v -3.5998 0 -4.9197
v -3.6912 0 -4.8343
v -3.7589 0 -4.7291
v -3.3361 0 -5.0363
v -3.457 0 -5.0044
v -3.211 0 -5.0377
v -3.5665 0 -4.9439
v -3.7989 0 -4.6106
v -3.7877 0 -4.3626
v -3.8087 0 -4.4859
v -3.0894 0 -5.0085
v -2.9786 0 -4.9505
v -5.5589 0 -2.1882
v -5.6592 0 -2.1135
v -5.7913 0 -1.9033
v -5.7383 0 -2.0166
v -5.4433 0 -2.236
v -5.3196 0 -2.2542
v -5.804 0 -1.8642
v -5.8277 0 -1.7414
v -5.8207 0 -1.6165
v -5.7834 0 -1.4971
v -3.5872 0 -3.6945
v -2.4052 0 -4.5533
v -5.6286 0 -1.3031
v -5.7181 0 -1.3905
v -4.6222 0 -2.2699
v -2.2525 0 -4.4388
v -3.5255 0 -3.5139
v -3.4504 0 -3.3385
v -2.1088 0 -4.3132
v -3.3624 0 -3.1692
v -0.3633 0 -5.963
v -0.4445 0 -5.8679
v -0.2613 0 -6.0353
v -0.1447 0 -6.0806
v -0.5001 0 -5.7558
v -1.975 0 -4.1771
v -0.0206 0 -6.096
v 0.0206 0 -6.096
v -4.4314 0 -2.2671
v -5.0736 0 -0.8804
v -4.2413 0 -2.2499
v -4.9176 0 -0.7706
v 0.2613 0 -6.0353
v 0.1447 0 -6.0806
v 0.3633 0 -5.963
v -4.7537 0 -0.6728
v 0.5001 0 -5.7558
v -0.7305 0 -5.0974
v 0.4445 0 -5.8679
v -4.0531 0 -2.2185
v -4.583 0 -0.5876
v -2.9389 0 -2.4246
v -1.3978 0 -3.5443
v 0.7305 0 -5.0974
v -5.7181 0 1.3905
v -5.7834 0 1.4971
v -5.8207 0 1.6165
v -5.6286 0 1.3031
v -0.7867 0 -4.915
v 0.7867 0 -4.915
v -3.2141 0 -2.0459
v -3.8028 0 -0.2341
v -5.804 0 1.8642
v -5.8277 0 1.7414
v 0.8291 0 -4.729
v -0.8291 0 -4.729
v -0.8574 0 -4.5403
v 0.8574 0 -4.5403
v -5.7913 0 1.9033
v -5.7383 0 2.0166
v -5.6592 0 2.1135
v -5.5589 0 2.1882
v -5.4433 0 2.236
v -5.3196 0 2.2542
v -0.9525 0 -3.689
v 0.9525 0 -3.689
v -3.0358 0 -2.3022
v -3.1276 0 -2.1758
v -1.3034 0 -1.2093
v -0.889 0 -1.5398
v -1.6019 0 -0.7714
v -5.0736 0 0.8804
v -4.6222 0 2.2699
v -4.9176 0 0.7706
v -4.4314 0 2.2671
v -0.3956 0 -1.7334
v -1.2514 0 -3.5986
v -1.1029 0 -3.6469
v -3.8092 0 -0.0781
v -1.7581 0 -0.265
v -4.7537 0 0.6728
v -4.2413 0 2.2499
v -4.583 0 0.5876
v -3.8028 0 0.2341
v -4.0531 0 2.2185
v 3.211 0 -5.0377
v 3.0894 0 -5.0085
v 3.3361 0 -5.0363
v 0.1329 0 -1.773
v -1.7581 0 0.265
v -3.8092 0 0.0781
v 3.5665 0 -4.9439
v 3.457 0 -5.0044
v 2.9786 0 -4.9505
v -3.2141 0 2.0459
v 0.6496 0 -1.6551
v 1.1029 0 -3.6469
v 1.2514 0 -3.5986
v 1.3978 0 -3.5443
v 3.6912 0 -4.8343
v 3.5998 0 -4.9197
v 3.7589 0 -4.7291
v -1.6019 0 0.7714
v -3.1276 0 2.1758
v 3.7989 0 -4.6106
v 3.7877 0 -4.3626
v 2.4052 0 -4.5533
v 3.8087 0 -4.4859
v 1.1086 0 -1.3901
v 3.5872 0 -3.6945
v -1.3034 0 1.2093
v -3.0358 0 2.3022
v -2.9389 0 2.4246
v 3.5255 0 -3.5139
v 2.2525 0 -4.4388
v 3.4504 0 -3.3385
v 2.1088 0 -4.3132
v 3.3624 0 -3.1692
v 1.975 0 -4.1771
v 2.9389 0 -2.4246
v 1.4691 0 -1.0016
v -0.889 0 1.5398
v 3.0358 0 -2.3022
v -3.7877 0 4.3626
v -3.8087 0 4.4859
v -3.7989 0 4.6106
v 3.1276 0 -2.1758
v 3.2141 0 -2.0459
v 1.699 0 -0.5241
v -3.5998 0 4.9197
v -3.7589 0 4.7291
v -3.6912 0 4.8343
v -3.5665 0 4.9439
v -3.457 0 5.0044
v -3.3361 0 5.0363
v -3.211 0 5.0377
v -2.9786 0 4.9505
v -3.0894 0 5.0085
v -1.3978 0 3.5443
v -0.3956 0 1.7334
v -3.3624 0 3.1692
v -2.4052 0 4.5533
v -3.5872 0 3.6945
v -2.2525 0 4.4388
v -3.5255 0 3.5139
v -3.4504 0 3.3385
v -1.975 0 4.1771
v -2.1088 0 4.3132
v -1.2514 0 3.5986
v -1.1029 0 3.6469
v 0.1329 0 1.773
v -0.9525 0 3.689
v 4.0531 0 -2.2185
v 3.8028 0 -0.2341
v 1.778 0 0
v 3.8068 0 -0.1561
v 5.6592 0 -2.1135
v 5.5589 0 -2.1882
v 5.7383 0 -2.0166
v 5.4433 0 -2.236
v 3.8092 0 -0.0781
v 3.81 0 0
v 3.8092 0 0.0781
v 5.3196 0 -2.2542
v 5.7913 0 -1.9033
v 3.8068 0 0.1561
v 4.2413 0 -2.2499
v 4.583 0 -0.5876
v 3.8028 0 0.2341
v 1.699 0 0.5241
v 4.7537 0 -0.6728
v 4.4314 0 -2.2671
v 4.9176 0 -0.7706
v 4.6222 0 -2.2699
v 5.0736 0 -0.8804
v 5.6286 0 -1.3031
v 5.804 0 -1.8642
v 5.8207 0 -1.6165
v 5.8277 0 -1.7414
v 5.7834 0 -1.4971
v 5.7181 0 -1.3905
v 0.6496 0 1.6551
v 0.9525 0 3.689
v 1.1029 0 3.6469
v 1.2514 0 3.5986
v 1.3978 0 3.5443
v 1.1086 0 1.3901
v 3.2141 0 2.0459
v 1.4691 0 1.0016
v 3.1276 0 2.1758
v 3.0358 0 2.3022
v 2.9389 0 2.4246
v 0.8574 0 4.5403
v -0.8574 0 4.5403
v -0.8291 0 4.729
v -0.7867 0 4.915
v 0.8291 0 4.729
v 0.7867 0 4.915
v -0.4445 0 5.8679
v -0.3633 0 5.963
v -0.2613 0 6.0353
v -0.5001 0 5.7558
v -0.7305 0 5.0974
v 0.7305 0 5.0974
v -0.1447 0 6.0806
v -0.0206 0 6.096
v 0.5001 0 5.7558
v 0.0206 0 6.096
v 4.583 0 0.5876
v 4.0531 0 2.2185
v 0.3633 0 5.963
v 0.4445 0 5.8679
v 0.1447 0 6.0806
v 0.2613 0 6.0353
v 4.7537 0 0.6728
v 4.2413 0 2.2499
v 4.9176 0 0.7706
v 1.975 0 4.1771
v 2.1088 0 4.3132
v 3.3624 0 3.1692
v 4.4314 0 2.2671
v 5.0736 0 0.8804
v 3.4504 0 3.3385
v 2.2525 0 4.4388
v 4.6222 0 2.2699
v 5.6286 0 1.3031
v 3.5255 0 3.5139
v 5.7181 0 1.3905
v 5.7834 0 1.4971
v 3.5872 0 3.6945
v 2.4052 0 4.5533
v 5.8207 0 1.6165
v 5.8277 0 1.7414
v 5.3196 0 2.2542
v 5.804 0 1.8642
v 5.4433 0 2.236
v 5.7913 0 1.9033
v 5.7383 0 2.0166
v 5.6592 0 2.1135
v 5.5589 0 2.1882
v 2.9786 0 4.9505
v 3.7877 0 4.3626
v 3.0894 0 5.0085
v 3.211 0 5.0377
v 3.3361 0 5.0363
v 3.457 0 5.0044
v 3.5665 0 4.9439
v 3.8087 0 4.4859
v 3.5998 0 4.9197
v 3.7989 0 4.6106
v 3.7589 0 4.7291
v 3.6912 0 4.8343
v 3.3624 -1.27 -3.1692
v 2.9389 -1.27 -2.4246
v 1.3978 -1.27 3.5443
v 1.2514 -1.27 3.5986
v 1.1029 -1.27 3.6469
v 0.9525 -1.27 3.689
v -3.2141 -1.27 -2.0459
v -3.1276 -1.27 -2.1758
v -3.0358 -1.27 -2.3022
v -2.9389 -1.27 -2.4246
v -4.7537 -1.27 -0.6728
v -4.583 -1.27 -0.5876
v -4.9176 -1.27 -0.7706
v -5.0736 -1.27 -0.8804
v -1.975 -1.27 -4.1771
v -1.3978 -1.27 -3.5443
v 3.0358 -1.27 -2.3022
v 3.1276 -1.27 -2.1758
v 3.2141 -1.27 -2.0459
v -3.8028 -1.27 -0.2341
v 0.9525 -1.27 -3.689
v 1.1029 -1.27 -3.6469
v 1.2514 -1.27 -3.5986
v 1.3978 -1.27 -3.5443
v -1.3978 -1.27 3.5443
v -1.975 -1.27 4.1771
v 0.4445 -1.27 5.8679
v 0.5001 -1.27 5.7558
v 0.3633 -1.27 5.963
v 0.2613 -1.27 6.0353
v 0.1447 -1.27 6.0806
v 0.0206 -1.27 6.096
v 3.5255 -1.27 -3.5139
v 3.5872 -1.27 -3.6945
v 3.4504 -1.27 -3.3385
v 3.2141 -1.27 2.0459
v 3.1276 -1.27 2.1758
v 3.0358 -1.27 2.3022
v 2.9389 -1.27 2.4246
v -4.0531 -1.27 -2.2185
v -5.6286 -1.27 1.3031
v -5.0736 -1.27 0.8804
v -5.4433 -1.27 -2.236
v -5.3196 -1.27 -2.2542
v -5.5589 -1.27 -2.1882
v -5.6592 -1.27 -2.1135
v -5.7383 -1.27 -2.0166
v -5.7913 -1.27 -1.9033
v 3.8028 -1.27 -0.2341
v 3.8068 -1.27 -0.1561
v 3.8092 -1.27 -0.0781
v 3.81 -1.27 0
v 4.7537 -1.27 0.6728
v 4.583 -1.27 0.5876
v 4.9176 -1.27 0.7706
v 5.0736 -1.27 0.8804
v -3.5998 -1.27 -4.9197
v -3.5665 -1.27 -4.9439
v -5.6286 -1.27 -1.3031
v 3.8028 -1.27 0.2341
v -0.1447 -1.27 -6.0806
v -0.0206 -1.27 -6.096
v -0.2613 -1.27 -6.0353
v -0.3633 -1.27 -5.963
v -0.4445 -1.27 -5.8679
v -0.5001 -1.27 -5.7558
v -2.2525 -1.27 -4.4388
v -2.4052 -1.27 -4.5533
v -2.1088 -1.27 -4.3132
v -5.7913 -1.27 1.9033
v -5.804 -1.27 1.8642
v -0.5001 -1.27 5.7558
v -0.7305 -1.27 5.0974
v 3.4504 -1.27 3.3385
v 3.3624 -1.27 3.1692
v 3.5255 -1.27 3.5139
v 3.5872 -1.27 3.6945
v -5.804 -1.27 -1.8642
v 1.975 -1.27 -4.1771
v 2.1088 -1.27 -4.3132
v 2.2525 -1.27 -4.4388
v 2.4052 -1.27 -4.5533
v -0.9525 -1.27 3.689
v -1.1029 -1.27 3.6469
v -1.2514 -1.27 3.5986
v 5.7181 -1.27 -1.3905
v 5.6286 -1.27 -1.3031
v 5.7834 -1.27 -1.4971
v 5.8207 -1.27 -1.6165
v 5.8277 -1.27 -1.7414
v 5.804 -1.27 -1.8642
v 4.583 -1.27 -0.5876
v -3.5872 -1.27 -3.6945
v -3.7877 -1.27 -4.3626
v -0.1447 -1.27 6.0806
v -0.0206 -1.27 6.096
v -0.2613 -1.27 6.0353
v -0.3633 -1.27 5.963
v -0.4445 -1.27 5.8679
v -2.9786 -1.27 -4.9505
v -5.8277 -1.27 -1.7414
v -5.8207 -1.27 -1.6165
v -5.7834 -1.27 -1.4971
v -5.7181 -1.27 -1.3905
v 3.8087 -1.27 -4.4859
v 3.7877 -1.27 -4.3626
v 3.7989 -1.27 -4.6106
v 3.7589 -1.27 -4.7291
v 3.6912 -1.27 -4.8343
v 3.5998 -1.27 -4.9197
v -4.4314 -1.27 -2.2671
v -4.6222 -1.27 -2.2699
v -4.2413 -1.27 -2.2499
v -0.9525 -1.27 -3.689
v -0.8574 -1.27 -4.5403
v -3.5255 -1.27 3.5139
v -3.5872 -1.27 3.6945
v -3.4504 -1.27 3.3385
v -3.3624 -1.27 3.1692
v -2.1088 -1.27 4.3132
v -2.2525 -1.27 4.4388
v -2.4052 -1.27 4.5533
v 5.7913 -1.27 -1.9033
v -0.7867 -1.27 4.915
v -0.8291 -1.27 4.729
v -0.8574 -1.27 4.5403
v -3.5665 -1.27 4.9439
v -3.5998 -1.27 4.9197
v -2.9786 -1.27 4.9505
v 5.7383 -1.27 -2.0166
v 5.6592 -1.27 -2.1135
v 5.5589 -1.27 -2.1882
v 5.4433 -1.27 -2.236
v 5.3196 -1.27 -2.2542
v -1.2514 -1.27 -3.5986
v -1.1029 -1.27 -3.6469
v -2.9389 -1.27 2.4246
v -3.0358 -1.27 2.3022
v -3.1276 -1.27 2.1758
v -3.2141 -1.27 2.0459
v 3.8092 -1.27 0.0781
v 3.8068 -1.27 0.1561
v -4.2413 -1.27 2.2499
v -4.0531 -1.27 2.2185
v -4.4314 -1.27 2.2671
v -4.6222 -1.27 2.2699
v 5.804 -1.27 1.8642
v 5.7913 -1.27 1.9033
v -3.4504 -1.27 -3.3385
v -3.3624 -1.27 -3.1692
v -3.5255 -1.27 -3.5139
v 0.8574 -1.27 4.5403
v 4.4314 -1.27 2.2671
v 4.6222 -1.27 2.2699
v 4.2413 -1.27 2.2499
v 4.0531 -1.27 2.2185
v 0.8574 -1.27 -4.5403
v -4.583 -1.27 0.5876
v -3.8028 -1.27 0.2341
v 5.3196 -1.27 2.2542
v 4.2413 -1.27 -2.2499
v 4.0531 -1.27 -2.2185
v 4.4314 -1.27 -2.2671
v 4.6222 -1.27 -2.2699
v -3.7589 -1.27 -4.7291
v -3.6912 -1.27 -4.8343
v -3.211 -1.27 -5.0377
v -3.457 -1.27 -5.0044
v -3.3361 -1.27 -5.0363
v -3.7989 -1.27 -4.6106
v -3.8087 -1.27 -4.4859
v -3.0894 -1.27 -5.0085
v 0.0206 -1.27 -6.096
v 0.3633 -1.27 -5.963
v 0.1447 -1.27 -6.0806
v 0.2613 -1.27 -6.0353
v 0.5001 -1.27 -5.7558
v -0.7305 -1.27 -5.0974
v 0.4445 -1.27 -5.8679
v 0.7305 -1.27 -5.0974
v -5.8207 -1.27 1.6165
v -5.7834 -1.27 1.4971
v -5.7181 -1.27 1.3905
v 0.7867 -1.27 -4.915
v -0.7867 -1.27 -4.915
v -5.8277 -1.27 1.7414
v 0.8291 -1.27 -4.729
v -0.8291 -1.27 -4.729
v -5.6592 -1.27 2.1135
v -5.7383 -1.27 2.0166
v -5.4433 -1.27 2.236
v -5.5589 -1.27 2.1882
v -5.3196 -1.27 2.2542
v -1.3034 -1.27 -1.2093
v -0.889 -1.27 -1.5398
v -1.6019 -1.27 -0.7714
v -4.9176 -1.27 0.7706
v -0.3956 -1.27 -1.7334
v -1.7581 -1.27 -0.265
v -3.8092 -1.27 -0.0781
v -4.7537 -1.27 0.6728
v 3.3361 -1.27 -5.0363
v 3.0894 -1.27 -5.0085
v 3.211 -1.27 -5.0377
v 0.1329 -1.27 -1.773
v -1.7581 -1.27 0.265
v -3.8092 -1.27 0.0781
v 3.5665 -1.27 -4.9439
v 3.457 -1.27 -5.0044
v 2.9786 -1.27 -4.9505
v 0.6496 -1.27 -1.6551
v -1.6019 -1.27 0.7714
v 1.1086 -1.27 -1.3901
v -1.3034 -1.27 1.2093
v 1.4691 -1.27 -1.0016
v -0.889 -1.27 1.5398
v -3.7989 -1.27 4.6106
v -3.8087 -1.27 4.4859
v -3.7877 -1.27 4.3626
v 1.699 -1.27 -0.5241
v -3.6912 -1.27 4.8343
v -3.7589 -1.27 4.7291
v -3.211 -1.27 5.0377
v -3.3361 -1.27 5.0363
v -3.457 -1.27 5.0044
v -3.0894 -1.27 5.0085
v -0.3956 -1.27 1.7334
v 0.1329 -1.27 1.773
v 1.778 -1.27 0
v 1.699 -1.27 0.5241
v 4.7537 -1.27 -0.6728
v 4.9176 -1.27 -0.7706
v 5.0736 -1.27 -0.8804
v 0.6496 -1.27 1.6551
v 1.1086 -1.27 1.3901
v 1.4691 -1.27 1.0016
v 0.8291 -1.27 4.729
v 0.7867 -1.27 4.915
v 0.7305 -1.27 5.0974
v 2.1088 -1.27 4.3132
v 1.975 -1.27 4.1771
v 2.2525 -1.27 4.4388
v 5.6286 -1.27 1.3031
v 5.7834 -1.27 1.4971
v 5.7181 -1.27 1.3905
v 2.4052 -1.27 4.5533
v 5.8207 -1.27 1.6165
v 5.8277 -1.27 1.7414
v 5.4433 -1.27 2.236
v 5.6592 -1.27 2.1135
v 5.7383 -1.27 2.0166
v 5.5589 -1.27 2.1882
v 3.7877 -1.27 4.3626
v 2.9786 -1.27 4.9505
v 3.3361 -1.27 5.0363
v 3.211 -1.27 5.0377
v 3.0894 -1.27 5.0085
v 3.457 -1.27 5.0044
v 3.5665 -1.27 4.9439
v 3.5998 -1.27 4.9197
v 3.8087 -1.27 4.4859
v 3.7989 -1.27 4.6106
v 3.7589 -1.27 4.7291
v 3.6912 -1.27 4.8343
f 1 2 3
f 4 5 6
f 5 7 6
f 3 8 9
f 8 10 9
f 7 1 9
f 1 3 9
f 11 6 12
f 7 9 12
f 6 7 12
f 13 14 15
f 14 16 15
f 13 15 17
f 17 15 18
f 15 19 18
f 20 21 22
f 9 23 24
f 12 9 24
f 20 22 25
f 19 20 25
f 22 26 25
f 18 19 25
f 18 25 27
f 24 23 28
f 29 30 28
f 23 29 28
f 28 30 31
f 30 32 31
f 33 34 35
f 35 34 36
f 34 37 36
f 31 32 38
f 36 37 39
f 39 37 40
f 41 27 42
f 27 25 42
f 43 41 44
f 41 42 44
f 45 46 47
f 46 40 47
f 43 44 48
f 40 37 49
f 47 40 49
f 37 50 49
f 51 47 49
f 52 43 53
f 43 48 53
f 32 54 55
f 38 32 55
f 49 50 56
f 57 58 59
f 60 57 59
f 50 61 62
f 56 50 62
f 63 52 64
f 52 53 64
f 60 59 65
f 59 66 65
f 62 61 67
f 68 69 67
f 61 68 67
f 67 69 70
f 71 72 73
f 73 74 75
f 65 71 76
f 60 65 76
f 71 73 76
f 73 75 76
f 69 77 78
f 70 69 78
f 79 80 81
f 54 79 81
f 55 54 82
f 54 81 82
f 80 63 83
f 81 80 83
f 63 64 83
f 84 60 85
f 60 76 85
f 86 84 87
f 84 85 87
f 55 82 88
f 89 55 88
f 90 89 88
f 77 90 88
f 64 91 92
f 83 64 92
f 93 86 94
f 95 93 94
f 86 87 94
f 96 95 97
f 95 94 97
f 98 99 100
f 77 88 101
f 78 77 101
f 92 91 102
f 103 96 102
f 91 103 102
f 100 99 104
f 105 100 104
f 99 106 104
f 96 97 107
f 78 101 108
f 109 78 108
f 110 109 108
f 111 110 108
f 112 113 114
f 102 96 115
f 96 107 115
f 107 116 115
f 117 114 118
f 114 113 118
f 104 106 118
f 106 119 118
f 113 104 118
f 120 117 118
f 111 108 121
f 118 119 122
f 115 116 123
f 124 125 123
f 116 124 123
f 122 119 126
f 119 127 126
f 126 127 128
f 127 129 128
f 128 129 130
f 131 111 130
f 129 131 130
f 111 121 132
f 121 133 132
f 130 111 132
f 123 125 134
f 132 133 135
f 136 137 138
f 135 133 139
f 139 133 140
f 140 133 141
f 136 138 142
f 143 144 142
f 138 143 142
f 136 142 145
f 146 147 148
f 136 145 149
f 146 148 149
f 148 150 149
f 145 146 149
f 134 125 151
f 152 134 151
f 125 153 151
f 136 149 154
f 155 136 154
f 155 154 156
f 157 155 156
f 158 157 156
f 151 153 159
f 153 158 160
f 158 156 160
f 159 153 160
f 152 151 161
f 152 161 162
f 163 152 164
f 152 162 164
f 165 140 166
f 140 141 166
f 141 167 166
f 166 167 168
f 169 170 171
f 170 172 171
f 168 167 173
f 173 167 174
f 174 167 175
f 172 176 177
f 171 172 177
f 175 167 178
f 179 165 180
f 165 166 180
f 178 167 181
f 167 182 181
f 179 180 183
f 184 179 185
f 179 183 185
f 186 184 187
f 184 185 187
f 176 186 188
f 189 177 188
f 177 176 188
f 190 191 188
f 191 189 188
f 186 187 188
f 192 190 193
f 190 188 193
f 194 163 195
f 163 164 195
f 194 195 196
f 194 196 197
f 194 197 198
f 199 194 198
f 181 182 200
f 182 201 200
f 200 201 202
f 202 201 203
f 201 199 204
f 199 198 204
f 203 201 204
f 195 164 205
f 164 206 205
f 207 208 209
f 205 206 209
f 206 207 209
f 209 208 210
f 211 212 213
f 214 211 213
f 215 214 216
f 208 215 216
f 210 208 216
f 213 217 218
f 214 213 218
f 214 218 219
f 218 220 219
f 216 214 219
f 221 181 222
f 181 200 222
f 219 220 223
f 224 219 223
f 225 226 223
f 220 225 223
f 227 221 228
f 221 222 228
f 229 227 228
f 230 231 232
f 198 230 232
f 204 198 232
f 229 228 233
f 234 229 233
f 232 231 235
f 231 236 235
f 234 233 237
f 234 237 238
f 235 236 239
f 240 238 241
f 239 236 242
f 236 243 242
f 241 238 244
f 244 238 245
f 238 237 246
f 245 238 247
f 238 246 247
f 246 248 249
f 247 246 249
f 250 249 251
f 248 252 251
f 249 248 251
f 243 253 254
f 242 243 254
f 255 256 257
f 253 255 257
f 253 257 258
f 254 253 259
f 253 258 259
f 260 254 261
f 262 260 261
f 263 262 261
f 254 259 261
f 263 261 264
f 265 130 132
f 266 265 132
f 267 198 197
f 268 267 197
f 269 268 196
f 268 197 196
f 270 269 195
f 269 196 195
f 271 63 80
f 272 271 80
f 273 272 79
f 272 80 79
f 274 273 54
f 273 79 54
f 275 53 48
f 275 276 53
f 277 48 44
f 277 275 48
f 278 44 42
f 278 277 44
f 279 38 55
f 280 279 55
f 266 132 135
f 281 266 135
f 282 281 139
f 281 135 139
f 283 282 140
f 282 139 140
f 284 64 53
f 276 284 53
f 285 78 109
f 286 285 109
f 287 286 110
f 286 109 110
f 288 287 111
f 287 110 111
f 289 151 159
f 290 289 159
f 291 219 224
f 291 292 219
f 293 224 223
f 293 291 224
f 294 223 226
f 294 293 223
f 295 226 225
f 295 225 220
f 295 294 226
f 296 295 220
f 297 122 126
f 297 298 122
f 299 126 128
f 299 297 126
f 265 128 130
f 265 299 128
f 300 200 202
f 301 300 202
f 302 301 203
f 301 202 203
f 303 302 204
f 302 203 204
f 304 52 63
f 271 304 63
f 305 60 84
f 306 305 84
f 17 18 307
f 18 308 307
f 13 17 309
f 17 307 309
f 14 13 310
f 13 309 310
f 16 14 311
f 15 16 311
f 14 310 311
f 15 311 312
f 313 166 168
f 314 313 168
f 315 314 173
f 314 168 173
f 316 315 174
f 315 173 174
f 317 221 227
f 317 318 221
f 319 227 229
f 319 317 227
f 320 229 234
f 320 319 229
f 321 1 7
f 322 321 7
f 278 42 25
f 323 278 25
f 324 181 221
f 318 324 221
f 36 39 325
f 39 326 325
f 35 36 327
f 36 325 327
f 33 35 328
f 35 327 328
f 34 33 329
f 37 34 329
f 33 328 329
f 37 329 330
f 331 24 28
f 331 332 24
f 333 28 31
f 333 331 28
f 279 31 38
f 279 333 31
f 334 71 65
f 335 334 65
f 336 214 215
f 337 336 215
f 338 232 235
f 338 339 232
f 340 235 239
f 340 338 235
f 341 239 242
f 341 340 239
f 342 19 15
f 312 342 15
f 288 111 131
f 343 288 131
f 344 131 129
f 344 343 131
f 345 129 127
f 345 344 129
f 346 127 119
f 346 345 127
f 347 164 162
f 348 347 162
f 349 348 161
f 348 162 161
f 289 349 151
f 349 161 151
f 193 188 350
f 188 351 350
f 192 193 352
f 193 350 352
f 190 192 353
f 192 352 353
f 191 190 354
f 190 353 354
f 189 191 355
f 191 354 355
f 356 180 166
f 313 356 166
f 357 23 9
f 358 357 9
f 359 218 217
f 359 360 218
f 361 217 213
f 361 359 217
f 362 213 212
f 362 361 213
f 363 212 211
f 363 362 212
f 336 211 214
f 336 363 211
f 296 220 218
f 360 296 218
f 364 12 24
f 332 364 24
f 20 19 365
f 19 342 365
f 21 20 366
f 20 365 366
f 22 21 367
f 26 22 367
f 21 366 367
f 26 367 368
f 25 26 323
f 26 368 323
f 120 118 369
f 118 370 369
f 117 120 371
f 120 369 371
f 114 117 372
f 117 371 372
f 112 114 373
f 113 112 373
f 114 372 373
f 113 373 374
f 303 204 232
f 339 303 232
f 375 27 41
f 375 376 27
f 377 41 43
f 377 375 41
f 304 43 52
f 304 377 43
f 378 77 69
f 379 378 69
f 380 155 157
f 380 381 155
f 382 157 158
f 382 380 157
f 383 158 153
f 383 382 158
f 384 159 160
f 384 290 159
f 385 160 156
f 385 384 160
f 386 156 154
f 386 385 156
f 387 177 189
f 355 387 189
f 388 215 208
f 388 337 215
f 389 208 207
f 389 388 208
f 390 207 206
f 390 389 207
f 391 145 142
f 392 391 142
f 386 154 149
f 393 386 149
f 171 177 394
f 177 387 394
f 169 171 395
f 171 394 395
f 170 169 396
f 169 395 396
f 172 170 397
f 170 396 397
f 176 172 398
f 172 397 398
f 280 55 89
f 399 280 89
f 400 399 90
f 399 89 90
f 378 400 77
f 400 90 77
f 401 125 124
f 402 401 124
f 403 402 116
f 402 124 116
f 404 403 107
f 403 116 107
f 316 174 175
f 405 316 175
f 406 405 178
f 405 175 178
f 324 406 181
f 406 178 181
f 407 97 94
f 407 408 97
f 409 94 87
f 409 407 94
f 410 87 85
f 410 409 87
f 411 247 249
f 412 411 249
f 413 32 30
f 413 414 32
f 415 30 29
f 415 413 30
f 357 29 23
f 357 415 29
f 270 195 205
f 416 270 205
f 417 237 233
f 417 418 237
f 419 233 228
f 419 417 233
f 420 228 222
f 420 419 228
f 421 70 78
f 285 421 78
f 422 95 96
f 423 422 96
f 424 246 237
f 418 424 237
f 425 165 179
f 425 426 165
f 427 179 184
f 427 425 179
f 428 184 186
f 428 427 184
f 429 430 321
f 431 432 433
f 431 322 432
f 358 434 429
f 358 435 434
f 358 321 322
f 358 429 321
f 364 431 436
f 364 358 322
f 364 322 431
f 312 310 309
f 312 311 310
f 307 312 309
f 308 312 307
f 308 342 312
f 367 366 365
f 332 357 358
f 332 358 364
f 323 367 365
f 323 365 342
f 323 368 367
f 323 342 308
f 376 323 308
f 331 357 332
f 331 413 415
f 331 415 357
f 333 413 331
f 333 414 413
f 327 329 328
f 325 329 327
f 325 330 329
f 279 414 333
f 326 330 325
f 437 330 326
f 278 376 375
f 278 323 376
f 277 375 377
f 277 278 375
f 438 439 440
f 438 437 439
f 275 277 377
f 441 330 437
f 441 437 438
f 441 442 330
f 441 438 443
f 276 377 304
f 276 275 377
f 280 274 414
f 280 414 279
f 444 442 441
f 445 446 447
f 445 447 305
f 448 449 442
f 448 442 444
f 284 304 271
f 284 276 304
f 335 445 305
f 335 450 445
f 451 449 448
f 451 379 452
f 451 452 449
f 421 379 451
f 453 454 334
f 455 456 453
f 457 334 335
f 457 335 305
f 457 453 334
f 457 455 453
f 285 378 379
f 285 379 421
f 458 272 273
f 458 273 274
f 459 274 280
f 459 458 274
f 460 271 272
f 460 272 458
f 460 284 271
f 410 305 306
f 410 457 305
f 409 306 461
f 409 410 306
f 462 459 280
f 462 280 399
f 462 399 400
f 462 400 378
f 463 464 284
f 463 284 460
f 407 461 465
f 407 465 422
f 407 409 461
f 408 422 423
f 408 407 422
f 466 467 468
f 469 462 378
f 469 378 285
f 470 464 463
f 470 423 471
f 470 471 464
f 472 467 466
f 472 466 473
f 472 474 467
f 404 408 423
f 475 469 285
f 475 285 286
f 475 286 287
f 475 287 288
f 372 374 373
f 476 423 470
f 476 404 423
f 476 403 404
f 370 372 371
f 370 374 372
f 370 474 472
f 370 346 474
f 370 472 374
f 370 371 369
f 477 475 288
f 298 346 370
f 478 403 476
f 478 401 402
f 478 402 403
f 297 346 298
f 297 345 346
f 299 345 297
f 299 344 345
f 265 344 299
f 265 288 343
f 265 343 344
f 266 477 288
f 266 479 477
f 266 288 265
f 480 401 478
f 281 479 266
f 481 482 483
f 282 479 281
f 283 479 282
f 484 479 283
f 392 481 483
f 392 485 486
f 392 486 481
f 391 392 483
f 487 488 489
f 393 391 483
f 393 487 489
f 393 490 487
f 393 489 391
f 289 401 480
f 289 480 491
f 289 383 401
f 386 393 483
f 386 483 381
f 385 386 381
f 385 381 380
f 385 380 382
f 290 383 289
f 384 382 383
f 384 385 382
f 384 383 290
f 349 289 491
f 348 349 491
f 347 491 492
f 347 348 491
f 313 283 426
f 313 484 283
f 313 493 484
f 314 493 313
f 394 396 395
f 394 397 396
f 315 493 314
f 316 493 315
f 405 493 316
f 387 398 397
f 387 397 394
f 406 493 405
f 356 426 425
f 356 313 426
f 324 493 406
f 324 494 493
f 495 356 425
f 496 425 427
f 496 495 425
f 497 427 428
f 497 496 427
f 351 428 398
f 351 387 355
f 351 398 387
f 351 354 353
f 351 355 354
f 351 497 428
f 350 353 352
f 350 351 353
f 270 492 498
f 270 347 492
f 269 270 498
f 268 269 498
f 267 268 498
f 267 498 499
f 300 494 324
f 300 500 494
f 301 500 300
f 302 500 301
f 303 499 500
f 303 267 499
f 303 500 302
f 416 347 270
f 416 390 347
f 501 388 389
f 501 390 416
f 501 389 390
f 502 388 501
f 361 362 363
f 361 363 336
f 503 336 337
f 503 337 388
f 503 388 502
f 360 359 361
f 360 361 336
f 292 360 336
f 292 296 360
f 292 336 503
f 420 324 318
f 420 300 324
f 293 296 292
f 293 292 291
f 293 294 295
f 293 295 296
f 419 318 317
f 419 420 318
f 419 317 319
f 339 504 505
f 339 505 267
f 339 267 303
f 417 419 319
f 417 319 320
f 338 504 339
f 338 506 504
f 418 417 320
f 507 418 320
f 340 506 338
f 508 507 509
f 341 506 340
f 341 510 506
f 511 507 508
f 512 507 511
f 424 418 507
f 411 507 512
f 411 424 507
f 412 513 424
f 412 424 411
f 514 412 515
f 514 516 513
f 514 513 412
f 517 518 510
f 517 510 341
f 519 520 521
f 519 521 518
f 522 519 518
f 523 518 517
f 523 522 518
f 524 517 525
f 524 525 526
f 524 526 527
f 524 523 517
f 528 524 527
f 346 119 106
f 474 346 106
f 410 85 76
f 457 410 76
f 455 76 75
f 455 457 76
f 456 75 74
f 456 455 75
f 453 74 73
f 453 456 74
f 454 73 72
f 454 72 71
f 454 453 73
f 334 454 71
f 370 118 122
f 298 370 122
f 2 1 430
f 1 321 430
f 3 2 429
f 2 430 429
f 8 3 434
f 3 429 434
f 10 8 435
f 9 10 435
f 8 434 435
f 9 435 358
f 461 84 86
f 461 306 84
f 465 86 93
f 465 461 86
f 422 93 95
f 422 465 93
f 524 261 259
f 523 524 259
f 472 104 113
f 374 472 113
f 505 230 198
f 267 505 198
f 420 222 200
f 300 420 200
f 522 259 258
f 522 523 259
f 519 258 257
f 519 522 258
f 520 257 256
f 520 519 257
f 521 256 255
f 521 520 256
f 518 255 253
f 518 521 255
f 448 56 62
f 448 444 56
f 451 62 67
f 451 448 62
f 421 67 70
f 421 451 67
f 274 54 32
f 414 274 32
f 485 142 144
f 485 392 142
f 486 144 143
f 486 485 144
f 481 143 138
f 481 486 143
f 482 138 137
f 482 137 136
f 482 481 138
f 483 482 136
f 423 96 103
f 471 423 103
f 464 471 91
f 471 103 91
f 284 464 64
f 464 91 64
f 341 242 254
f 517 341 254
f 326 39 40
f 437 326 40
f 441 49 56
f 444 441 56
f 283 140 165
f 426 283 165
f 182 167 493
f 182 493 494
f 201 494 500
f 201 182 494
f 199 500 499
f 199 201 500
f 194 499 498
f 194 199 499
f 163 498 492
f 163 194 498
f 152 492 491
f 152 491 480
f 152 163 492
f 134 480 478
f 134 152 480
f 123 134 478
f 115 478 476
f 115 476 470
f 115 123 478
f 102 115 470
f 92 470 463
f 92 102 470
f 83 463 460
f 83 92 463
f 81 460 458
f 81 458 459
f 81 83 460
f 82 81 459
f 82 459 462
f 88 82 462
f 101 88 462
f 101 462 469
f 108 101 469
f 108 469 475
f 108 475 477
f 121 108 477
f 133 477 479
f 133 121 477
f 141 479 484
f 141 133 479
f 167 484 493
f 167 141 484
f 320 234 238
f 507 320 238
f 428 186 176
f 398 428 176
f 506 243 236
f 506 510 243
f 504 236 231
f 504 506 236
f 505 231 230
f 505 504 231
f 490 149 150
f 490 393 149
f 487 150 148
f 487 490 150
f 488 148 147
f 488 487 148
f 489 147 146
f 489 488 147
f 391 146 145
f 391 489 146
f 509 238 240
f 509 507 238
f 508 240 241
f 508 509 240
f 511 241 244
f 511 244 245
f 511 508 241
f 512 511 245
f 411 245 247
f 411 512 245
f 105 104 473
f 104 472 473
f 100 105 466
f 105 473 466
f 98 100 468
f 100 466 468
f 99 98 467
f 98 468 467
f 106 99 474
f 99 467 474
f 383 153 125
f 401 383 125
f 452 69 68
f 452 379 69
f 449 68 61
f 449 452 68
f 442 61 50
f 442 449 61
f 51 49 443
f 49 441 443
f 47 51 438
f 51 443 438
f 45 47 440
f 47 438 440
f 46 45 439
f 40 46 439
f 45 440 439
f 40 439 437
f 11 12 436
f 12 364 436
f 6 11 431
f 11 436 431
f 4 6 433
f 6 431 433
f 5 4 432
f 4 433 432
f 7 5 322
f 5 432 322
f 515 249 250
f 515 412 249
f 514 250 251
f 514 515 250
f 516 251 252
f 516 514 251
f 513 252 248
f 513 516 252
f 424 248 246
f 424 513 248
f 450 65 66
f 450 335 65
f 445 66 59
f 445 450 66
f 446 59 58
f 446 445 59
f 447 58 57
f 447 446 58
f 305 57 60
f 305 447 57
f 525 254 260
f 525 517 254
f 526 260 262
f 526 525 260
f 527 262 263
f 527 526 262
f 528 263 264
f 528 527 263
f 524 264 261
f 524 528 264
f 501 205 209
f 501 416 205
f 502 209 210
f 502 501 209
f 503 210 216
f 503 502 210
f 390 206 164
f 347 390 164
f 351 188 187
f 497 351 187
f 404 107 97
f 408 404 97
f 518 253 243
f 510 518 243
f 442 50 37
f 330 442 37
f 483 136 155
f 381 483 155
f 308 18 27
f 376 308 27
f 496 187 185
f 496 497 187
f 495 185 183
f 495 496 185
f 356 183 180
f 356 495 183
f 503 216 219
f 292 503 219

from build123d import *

# Parameters (mm, degrees)
F0_R     = 3.556
F1_DEPTH = 2.54
F2_R     = 5.08
F3_R     = 1.016
F4_SCALE = 0.5


with BuildPart() as f1:
    # F0 (on Front) → F1 (new body)
    with BuildSketch(Plane.XZ):
        with BuildLine():
            ThreePointArc((7.6056039975, -0.4681750033), (7.616400149, -0.2341981419), (7.62, 0))
            ThreePointArc((7.62, 0), (7.616400149, 0.2341981419), (7.6056039975, 0.4681750033))
            ThreePointArc((7.6056039975, 0.4681750033), (7.2470506542, 2.3547094971), (6.4282492489, 4.0917003304))
            ThreePointArc((6.4282492489, 4.0917003304), (6.1647094971, 4.4789236225), (5.877876524, 4.8492233985))
            ThreePointArc((5.877876524, 4.8492233985), (4.4789236225, 6.1647094971), (2.7955217754, 7.0886852098))
            ThreePointArc((2.7955217754, 7.0886852098), (2.3547094971, 7.2470506542), (1.905, 7.3780332745))
            ThreePointArc((1.905, 7.3780332745), (0, 7.62), (-1.905, 7.3780332745))
            ThreePointArc((-1.905, 7.3780332745), (-2.3547094971, 7.2470506542), (-2.7955217754, 7.0886852098))
            ThreePointArc((-2.7955217754, 7.0886852098), (-4.4789236225, 6.1647094971), (-5.877876524, 4.8492233985))
            ThreePointArc((-5.877876524, 4.8492233985), (-6.1647094971, 4.4789236225), (-6.4282492489, 4.0917003304))
            ThreePointArc((-6.4282492489, 4.0917003304), (-7.2470506542, 2.3547094971), (-7.6056039975, 0.4681750033))
            ThreePointArc((-7.6056039975, 0.4681750033), (-7.62, 0), (-7.6056039975, -0.4681750033))
            ThreePointArc((-7.6056039975, -0.4681750033), (-7.2470506542, -2.3547094971), (-6.4282492489, -4.0917003304))
            ThreePointArc((-6.4282492489, -4.0917003304), (-6.1647094971, -4.4789236225), (-5.877876524, -4.8492233985))
            ThreePointArc((-5.877876524, -4.8492233985), (-4.4789236225, -6.1647094971), (-2.7955217754, -7.0886852098))
            ThreePointArc((-2.7955217754, -7.0886852098), (-2.3547094971, -7.2470506542), (-1.905, -7.3780332745))
            ThreePointArc((-1.905, -7.3780332745), (0, -7.62), (1.905, -7.3780332745))
            ThreePointArc((1.905, -7.3780332745), (2.3547094971, -7.2470506542), (2.7955217754, -7.0886852098))
            ThreePointArc((2.7955217754, -7.0886852098), (4.4789236225, -6.1647094971), (5.877876524, -4.8492233985))
            ThreePointArc((5.877876524, -4.8492233985), (6.1647094971, -4.4789236225), (6.4282492489, -4.0917003304))
            ThreePointArc((6.4282492489, -4.0917003304), (7.2470506542, -2.3547094971), (7.6056039975, -0.4681750033))
        make_face()
        Circle(F0_R, mode=Mode.SUBTRACT)
        with BuildLine():
            ThreePointArc((6.4282492489, 4.0917003304), (7.2470506542, 2.3547094971), (7.6056039975, 0.4681750033))
            Line((7.6056039975, 0.4681750033), (9.689784553, 1.4124377213))
            Line((9.689784553, 1.4124377213), (11.8307519964, 3.04283013))
            Line((11.8307519964, 3.04283013), (11.359810097, 4.4922402608))
            Line((11.359810097, 4.4922402608), (8.6694104376, 4.5528263381))
            Line((8.6694104376, 4.5528263381), (6.4282492489, 4.0917003304))
        make_face()
        with BuildLine():
            Line((9.689784553, -1.4124377213), (7.6056039975, -0.4681750033))
            ThreePointArc((7.6056039975, -0.4681750033), (7.2470506542, -2.3547094971), (6.4282492489, -4.0917003304))
            Line((6.4282492489, -4.0917003304), (8.6694104376, -4.5528263381))
            Line((8.6694104376, -4.5528263381), (11.359810097, -4.4922402608))
            Line((11.359810097, -4.4922402608), (11.8307519964, -3.04283013))
            Line((11.8307519964, -3.04283013), (9.689784553, -1.4124377213))
        make_face()
        with BuildLine():
            ThreePointArc((2.7955217754, 7.0886852098), (4.4789236225, 6.1647094971), (5.877876524, 4.8492233985))
            Line((5.877876524, 4.8492233985), (7.0089903128, 6.8381985782))
            Line((7.0089903128, 6.8381985782), (7.7827487457, 9.4156428332))
            Line((7.7827487457, 9.4156428332), (6.5498068462, 10.3114275577))
            Line((6.5498068462, 10.3114275577), (4.3376161974, 8.7790654812))
            Line((4.3376161974, 8.7790654812), (2.7955217754, 7.0886852098))
        make_face()
        with BuildLine():
            Line((7.0089903128, -6.8381985782), (5.877876524, -4.8492233985))
            ThreePointArc((5.877876524, -4.8492233985), (4.4789236225, -6.1647094971), (2.7955217754, -7.0886852098))
            Line((2.7955217754, -7.0886852098), (4.3376161974, -8.7790654812))
            Line((4.3376161974, -8.7790654812), (6.5498068462, -10.3114275577))
            Line((6.5498068462, -10.3114275577), (7.7827487457, -9.4156428332))
            Line((7.7827487457, -9.4156428332), (7.0089903128, -6.8381985782))
        make_face()
        with BuildLine():
            ThreePointArc((-1.905, 7.3780332745), (0, 7.62), (1.905, 7.3780332745))
            Line((1.905, 7.3780332745), (1.651, 9.652))
            Line((1.651, 9.652), (0.762, 12.192))
            Line((0.762, 12.192), (-0.762, 12.192))
            Line((-0.762, 12.192), (-1.651, 9.652))
            Line((-1.651, 9.652), (-1.905, 7.3780332745))
        make_face()
        with BuildLine():
            Line((1.651, -9.652), (1.905, -7.3780332745))
            ThreePointArc((1.905, -7.3780332745), (0, -7.62), (-1.905, -7.3780332745))
            Line((-1.905, -7.3780332745), (-1.651, -9.652))
            Line((-1.651, -9.652), (-0.762, -12.192))
            Line((-0.762, -12.192), (0.762, -12.192))
            Line((0.762, -12.192), (1.651, -9.652))
        make_face()
        with BuildLine():
            ThreePointArc((-5.877876524, 4.8492233985), (-4.4789236225, 6.1647094971), (-2.7955217754, 7.0886852098))
            Line((-2.7955217754, 7.0886852098), (-4.3376161974, 8.7790654812))
            Line((-4.3376161974, 8.7790654812), (-6.5498068462, 10.3114275577))
            Line((-6.5498068462, 10.3114275577), (-7.7827487457, 9.4156428332))
            Line((-7.7827487457, 9.4156428332), (-7.0089903128, 6.8381985782))
            Line((-7.0089903128, 6.8381985782), (-5.877876524, 4.8492233985))
        make_face()
        with BuildLine():
            Line((-4.3376161974, -8.7790654812), (-2.7955217754, -7.0886852098))
            ThreePointArc((-2.7955217754, -7.0886852098), (-4.4789236225, -6.1647094971), (-5.877876524, -4.8492233985))
            Line((-5.877876524, -4.8492233985), (-7.0089903128, -6.8381985782))
            Line((-7.0089903128, -6.8381985782), (-7.7827487457, -9.4156428332))
            Line((-7.7827487457, -9.4156428332), (-6.5498068462, -10.3114275577))
            Line((-6.5498068462, -10.3114275577), (-4.3376161974, -8.7790654812))
        make_face()
        with BuildLine():
            ThreePointArc((-7.6056039975, 0.4681750033), (-7.2470506542, 2.3547094971), (-6.4282492489, 4.0917003304))
            Line((-6.4282492489, 4.0917003304), (-8.6694104376, 4.5528263381))
            Line((-8.6694104376, 4.5528263381), (-11.359810097, 4.4922402608))
            Line((-11.359810097, 4.4922402608), (-11.8307519964, 3.04283013))
            Line((-11.8307519964, 3.04283013), (-9.689784553, 1.4124377213))
            Line((-9.689784553, 1.4124377213), (-7.6056039975, 0.4681750033))
        make_face()
        with BuildLine():
            Line((-8.6694104376, -4.5528263381), (-6.4282492489, -4.0917003304))
            ThreePointArc((-6.4282492489, -4.0917003304), (-7.2470506542, -2.3547094971), (-7.6056039975, -0.4681750033))
            Line((-7.6056039975, -0.4681750033), (-9.689784553, -1.4124377213))
            Line((-9.689784553, -1.4124377213), (-11.8307519964, -3.04283013))
            Line((-11.8307519964, -3.04283013), (-11.359810097, -4.4922402608))
            Line((-11.359810097, -4.4922402608), (-8.6694104376, -4.5528263381))
        make_face()
    extrude(amount=F1_DEPTH)

    # F2
    f2_edges = [f1.edges().sort_by_distance(p)[0] for p in [
        (7.00899, -1.27, 6.838199),
        (4.337616, -1.27, 8.779065),
        (1.651, -1.27, 9.652),
        (-4.337616, -1.27, 8.779065),
        (-8.66941, -1.27, 4.552826),
        (-9.689785, -1.27, -1.412438),
        (-7.00899, -1.27, -6.838199),
        (-1.651, -1.27, -9.652),
        (4.337616, -1.27, -8.779065),
        (8.66941, -1.27, -4.552826),
        (9.689785, -1.27, 1.412438),
        (9.689785, -1.27, -1.412438),
        (8.66941, -1.27, 4.552826),
        (-1.651, -1.27, 9.652),
        (-7.00899, -1.27, 6.838199),
        (-9.689785, -1.27, 1.412438),
        (-8.66941, -1.27, -4.552826),
        (-4.337616, -1.27, -8.779065),
        (1.651, -1.27, -9.652),
        (7.00899, -1.27, -6.838199),
    ]]
    fillet(f2_edges, radius=F2_R)

    # F3
    f3_edges = [f1.edges().sort_by_distance(p)[0] for p in [
        (0.762, -1.27, 12.192),
        (-0.762, -1.27, 12.192),
        (-6.549807, -1.27, 10.311428),
        (-7.782749, -1.27, 9.415643),
        (-11.35981, -1.27, 4.49224),
        (6.549807, -1.27, 10.311428),
        (7.782749, -1.27, 9.415643),
        (11.35981, -1.27, 4.49224),
        (-11.830752, -1.27, 3.04283),
        (-11.830752, -1.27, -3.04283),
        (-11.35981, -1.27, -4.49224),
        (-7.782749, -1.27, -9.415643),
        (-6.549807, -1.27, -10.311428),
        (-0.762, -1.27, -12.192),
        (0.762, -1.27, -12.192),
        (6.549807, -1.27, -10.311428),
        (7.782749, -1.27, -9.415643),
        (11.830752, -1.27, -3.04283),
        (11.35981, -1.27, -4.49224),
        (11.830752, -1.27, 3.04283),
    ]]
    fillet(f3_edges, radius=F3_R)


with BuildPart() as f1_1:
    # F4: moved
    add(f1.part.scale(F4_SCALE))


solid = f1_1.part
